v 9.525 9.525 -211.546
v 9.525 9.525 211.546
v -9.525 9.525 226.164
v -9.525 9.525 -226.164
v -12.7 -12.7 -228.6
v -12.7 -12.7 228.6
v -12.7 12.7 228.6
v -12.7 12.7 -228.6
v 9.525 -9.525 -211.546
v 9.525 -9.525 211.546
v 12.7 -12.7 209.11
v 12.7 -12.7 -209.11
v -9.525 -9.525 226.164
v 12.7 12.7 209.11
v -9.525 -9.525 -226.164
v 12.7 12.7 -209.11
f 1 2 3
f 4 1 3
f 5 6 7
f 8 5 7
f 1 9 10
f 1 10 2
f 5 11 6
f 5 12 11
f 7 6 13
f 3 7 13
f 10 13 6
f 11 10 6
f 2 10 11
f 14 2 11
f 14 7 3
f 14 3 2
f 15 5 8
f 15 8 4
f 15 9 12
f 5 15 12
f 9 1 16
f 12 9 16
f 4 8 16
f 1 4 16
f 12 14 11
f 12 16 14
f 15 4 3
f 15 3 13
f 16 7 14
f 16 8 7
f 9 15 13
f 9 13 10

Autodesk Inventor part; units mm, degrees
ref_plane "YZ Plane" through (0, 0, 0) normal (1, 0, 0) x (0, 1, 0)
ref_plane "XZ Plane" through (0, 0, 0) normal (0, 1, 0) x (-1, 0, 0)
ref_plane "XY Plane" through (0, 0, 0) normal (0, 0, 1) x (1, 0, 0)
sketch "Sketch1" plane through (0, 0, 0) normal (0, 0, 1) x (1, 0, 0)
  line L0 (-17.78, 0) -> (17.78, 0) projected
  line L1 (0, -17.78) -> (0, 17.78) projected
  line L2 (-12.7, 12.7) -> (12.7, 12.7)
  line L3 (12.7, 12.7) -> (12.7, -12.7)
  line L4 (12.7, -12.7) -> (-12.7, -12.7)
  line L5 (-12.7, -12.7) -> (-12.7, 12.7)
  line L6 (9.525, 9.525) -> (-9.525, 9.525)
  line L7 (-9.525, 9.525) -> (-9.525, -9.525)
  line L8 (-9.525, -9.525) -> (9.525, -9.525)
  line L9 (9.525, -9.525) -> (9.525, 9.525)
  point P0 (0, 0)
  point P1 (-12.7, 0)
  point P2 (0, 12.7)
  dimension "d0" = 25.4
  dimension "d1" = 3.175
extrude "Extrusion1" add sketch "Sketch1" along normal mid plane 457.2 contours L5 L2 L1 L6 L7 L0 | L0 L7 L8 L1 L4 L5 | L1 L8 L9 L0 L3 L4 | L2 L3 L0 L9 L6 L1
sketch "Sketch3" plane through (-12.7, 12.7, 228.6) normal (0, 1, 0) x (1, 0, 0)
  line L0 (0, 0) -> (25.4, 0) projected
  line L1 (25.4, 0) -> (25.4, 457.2) projected
  line L2 (0, 457.2) -> (0, 0) projected
  line L3 (0, 0) -> (25.4, 19.4901)
  line L4 (0, 228.6) -> (25.4, 228.6) construction
  line L5 (0, 0) -> (25.4, 0)
  line L6 (25.4, 0) -> (25.4, 19.4901)
  line L7 (0, 457.2) -> (25.4, 437.7099)
  line L8 (0, 457.2) -> (25.4, 457.2)
  line L9 (25.4, 457.2) -> (25.4, 437.7099)
  point P0 (12.7, 228.6)
  dimension "d7" = 37.5
extrude "Extrusion3" cut sketch "Sketch3" against normal through all contours L3 L1 L0 | L8 L1 L7
properties part number "tubing_template_0.125" material "Aluminum-6061"
